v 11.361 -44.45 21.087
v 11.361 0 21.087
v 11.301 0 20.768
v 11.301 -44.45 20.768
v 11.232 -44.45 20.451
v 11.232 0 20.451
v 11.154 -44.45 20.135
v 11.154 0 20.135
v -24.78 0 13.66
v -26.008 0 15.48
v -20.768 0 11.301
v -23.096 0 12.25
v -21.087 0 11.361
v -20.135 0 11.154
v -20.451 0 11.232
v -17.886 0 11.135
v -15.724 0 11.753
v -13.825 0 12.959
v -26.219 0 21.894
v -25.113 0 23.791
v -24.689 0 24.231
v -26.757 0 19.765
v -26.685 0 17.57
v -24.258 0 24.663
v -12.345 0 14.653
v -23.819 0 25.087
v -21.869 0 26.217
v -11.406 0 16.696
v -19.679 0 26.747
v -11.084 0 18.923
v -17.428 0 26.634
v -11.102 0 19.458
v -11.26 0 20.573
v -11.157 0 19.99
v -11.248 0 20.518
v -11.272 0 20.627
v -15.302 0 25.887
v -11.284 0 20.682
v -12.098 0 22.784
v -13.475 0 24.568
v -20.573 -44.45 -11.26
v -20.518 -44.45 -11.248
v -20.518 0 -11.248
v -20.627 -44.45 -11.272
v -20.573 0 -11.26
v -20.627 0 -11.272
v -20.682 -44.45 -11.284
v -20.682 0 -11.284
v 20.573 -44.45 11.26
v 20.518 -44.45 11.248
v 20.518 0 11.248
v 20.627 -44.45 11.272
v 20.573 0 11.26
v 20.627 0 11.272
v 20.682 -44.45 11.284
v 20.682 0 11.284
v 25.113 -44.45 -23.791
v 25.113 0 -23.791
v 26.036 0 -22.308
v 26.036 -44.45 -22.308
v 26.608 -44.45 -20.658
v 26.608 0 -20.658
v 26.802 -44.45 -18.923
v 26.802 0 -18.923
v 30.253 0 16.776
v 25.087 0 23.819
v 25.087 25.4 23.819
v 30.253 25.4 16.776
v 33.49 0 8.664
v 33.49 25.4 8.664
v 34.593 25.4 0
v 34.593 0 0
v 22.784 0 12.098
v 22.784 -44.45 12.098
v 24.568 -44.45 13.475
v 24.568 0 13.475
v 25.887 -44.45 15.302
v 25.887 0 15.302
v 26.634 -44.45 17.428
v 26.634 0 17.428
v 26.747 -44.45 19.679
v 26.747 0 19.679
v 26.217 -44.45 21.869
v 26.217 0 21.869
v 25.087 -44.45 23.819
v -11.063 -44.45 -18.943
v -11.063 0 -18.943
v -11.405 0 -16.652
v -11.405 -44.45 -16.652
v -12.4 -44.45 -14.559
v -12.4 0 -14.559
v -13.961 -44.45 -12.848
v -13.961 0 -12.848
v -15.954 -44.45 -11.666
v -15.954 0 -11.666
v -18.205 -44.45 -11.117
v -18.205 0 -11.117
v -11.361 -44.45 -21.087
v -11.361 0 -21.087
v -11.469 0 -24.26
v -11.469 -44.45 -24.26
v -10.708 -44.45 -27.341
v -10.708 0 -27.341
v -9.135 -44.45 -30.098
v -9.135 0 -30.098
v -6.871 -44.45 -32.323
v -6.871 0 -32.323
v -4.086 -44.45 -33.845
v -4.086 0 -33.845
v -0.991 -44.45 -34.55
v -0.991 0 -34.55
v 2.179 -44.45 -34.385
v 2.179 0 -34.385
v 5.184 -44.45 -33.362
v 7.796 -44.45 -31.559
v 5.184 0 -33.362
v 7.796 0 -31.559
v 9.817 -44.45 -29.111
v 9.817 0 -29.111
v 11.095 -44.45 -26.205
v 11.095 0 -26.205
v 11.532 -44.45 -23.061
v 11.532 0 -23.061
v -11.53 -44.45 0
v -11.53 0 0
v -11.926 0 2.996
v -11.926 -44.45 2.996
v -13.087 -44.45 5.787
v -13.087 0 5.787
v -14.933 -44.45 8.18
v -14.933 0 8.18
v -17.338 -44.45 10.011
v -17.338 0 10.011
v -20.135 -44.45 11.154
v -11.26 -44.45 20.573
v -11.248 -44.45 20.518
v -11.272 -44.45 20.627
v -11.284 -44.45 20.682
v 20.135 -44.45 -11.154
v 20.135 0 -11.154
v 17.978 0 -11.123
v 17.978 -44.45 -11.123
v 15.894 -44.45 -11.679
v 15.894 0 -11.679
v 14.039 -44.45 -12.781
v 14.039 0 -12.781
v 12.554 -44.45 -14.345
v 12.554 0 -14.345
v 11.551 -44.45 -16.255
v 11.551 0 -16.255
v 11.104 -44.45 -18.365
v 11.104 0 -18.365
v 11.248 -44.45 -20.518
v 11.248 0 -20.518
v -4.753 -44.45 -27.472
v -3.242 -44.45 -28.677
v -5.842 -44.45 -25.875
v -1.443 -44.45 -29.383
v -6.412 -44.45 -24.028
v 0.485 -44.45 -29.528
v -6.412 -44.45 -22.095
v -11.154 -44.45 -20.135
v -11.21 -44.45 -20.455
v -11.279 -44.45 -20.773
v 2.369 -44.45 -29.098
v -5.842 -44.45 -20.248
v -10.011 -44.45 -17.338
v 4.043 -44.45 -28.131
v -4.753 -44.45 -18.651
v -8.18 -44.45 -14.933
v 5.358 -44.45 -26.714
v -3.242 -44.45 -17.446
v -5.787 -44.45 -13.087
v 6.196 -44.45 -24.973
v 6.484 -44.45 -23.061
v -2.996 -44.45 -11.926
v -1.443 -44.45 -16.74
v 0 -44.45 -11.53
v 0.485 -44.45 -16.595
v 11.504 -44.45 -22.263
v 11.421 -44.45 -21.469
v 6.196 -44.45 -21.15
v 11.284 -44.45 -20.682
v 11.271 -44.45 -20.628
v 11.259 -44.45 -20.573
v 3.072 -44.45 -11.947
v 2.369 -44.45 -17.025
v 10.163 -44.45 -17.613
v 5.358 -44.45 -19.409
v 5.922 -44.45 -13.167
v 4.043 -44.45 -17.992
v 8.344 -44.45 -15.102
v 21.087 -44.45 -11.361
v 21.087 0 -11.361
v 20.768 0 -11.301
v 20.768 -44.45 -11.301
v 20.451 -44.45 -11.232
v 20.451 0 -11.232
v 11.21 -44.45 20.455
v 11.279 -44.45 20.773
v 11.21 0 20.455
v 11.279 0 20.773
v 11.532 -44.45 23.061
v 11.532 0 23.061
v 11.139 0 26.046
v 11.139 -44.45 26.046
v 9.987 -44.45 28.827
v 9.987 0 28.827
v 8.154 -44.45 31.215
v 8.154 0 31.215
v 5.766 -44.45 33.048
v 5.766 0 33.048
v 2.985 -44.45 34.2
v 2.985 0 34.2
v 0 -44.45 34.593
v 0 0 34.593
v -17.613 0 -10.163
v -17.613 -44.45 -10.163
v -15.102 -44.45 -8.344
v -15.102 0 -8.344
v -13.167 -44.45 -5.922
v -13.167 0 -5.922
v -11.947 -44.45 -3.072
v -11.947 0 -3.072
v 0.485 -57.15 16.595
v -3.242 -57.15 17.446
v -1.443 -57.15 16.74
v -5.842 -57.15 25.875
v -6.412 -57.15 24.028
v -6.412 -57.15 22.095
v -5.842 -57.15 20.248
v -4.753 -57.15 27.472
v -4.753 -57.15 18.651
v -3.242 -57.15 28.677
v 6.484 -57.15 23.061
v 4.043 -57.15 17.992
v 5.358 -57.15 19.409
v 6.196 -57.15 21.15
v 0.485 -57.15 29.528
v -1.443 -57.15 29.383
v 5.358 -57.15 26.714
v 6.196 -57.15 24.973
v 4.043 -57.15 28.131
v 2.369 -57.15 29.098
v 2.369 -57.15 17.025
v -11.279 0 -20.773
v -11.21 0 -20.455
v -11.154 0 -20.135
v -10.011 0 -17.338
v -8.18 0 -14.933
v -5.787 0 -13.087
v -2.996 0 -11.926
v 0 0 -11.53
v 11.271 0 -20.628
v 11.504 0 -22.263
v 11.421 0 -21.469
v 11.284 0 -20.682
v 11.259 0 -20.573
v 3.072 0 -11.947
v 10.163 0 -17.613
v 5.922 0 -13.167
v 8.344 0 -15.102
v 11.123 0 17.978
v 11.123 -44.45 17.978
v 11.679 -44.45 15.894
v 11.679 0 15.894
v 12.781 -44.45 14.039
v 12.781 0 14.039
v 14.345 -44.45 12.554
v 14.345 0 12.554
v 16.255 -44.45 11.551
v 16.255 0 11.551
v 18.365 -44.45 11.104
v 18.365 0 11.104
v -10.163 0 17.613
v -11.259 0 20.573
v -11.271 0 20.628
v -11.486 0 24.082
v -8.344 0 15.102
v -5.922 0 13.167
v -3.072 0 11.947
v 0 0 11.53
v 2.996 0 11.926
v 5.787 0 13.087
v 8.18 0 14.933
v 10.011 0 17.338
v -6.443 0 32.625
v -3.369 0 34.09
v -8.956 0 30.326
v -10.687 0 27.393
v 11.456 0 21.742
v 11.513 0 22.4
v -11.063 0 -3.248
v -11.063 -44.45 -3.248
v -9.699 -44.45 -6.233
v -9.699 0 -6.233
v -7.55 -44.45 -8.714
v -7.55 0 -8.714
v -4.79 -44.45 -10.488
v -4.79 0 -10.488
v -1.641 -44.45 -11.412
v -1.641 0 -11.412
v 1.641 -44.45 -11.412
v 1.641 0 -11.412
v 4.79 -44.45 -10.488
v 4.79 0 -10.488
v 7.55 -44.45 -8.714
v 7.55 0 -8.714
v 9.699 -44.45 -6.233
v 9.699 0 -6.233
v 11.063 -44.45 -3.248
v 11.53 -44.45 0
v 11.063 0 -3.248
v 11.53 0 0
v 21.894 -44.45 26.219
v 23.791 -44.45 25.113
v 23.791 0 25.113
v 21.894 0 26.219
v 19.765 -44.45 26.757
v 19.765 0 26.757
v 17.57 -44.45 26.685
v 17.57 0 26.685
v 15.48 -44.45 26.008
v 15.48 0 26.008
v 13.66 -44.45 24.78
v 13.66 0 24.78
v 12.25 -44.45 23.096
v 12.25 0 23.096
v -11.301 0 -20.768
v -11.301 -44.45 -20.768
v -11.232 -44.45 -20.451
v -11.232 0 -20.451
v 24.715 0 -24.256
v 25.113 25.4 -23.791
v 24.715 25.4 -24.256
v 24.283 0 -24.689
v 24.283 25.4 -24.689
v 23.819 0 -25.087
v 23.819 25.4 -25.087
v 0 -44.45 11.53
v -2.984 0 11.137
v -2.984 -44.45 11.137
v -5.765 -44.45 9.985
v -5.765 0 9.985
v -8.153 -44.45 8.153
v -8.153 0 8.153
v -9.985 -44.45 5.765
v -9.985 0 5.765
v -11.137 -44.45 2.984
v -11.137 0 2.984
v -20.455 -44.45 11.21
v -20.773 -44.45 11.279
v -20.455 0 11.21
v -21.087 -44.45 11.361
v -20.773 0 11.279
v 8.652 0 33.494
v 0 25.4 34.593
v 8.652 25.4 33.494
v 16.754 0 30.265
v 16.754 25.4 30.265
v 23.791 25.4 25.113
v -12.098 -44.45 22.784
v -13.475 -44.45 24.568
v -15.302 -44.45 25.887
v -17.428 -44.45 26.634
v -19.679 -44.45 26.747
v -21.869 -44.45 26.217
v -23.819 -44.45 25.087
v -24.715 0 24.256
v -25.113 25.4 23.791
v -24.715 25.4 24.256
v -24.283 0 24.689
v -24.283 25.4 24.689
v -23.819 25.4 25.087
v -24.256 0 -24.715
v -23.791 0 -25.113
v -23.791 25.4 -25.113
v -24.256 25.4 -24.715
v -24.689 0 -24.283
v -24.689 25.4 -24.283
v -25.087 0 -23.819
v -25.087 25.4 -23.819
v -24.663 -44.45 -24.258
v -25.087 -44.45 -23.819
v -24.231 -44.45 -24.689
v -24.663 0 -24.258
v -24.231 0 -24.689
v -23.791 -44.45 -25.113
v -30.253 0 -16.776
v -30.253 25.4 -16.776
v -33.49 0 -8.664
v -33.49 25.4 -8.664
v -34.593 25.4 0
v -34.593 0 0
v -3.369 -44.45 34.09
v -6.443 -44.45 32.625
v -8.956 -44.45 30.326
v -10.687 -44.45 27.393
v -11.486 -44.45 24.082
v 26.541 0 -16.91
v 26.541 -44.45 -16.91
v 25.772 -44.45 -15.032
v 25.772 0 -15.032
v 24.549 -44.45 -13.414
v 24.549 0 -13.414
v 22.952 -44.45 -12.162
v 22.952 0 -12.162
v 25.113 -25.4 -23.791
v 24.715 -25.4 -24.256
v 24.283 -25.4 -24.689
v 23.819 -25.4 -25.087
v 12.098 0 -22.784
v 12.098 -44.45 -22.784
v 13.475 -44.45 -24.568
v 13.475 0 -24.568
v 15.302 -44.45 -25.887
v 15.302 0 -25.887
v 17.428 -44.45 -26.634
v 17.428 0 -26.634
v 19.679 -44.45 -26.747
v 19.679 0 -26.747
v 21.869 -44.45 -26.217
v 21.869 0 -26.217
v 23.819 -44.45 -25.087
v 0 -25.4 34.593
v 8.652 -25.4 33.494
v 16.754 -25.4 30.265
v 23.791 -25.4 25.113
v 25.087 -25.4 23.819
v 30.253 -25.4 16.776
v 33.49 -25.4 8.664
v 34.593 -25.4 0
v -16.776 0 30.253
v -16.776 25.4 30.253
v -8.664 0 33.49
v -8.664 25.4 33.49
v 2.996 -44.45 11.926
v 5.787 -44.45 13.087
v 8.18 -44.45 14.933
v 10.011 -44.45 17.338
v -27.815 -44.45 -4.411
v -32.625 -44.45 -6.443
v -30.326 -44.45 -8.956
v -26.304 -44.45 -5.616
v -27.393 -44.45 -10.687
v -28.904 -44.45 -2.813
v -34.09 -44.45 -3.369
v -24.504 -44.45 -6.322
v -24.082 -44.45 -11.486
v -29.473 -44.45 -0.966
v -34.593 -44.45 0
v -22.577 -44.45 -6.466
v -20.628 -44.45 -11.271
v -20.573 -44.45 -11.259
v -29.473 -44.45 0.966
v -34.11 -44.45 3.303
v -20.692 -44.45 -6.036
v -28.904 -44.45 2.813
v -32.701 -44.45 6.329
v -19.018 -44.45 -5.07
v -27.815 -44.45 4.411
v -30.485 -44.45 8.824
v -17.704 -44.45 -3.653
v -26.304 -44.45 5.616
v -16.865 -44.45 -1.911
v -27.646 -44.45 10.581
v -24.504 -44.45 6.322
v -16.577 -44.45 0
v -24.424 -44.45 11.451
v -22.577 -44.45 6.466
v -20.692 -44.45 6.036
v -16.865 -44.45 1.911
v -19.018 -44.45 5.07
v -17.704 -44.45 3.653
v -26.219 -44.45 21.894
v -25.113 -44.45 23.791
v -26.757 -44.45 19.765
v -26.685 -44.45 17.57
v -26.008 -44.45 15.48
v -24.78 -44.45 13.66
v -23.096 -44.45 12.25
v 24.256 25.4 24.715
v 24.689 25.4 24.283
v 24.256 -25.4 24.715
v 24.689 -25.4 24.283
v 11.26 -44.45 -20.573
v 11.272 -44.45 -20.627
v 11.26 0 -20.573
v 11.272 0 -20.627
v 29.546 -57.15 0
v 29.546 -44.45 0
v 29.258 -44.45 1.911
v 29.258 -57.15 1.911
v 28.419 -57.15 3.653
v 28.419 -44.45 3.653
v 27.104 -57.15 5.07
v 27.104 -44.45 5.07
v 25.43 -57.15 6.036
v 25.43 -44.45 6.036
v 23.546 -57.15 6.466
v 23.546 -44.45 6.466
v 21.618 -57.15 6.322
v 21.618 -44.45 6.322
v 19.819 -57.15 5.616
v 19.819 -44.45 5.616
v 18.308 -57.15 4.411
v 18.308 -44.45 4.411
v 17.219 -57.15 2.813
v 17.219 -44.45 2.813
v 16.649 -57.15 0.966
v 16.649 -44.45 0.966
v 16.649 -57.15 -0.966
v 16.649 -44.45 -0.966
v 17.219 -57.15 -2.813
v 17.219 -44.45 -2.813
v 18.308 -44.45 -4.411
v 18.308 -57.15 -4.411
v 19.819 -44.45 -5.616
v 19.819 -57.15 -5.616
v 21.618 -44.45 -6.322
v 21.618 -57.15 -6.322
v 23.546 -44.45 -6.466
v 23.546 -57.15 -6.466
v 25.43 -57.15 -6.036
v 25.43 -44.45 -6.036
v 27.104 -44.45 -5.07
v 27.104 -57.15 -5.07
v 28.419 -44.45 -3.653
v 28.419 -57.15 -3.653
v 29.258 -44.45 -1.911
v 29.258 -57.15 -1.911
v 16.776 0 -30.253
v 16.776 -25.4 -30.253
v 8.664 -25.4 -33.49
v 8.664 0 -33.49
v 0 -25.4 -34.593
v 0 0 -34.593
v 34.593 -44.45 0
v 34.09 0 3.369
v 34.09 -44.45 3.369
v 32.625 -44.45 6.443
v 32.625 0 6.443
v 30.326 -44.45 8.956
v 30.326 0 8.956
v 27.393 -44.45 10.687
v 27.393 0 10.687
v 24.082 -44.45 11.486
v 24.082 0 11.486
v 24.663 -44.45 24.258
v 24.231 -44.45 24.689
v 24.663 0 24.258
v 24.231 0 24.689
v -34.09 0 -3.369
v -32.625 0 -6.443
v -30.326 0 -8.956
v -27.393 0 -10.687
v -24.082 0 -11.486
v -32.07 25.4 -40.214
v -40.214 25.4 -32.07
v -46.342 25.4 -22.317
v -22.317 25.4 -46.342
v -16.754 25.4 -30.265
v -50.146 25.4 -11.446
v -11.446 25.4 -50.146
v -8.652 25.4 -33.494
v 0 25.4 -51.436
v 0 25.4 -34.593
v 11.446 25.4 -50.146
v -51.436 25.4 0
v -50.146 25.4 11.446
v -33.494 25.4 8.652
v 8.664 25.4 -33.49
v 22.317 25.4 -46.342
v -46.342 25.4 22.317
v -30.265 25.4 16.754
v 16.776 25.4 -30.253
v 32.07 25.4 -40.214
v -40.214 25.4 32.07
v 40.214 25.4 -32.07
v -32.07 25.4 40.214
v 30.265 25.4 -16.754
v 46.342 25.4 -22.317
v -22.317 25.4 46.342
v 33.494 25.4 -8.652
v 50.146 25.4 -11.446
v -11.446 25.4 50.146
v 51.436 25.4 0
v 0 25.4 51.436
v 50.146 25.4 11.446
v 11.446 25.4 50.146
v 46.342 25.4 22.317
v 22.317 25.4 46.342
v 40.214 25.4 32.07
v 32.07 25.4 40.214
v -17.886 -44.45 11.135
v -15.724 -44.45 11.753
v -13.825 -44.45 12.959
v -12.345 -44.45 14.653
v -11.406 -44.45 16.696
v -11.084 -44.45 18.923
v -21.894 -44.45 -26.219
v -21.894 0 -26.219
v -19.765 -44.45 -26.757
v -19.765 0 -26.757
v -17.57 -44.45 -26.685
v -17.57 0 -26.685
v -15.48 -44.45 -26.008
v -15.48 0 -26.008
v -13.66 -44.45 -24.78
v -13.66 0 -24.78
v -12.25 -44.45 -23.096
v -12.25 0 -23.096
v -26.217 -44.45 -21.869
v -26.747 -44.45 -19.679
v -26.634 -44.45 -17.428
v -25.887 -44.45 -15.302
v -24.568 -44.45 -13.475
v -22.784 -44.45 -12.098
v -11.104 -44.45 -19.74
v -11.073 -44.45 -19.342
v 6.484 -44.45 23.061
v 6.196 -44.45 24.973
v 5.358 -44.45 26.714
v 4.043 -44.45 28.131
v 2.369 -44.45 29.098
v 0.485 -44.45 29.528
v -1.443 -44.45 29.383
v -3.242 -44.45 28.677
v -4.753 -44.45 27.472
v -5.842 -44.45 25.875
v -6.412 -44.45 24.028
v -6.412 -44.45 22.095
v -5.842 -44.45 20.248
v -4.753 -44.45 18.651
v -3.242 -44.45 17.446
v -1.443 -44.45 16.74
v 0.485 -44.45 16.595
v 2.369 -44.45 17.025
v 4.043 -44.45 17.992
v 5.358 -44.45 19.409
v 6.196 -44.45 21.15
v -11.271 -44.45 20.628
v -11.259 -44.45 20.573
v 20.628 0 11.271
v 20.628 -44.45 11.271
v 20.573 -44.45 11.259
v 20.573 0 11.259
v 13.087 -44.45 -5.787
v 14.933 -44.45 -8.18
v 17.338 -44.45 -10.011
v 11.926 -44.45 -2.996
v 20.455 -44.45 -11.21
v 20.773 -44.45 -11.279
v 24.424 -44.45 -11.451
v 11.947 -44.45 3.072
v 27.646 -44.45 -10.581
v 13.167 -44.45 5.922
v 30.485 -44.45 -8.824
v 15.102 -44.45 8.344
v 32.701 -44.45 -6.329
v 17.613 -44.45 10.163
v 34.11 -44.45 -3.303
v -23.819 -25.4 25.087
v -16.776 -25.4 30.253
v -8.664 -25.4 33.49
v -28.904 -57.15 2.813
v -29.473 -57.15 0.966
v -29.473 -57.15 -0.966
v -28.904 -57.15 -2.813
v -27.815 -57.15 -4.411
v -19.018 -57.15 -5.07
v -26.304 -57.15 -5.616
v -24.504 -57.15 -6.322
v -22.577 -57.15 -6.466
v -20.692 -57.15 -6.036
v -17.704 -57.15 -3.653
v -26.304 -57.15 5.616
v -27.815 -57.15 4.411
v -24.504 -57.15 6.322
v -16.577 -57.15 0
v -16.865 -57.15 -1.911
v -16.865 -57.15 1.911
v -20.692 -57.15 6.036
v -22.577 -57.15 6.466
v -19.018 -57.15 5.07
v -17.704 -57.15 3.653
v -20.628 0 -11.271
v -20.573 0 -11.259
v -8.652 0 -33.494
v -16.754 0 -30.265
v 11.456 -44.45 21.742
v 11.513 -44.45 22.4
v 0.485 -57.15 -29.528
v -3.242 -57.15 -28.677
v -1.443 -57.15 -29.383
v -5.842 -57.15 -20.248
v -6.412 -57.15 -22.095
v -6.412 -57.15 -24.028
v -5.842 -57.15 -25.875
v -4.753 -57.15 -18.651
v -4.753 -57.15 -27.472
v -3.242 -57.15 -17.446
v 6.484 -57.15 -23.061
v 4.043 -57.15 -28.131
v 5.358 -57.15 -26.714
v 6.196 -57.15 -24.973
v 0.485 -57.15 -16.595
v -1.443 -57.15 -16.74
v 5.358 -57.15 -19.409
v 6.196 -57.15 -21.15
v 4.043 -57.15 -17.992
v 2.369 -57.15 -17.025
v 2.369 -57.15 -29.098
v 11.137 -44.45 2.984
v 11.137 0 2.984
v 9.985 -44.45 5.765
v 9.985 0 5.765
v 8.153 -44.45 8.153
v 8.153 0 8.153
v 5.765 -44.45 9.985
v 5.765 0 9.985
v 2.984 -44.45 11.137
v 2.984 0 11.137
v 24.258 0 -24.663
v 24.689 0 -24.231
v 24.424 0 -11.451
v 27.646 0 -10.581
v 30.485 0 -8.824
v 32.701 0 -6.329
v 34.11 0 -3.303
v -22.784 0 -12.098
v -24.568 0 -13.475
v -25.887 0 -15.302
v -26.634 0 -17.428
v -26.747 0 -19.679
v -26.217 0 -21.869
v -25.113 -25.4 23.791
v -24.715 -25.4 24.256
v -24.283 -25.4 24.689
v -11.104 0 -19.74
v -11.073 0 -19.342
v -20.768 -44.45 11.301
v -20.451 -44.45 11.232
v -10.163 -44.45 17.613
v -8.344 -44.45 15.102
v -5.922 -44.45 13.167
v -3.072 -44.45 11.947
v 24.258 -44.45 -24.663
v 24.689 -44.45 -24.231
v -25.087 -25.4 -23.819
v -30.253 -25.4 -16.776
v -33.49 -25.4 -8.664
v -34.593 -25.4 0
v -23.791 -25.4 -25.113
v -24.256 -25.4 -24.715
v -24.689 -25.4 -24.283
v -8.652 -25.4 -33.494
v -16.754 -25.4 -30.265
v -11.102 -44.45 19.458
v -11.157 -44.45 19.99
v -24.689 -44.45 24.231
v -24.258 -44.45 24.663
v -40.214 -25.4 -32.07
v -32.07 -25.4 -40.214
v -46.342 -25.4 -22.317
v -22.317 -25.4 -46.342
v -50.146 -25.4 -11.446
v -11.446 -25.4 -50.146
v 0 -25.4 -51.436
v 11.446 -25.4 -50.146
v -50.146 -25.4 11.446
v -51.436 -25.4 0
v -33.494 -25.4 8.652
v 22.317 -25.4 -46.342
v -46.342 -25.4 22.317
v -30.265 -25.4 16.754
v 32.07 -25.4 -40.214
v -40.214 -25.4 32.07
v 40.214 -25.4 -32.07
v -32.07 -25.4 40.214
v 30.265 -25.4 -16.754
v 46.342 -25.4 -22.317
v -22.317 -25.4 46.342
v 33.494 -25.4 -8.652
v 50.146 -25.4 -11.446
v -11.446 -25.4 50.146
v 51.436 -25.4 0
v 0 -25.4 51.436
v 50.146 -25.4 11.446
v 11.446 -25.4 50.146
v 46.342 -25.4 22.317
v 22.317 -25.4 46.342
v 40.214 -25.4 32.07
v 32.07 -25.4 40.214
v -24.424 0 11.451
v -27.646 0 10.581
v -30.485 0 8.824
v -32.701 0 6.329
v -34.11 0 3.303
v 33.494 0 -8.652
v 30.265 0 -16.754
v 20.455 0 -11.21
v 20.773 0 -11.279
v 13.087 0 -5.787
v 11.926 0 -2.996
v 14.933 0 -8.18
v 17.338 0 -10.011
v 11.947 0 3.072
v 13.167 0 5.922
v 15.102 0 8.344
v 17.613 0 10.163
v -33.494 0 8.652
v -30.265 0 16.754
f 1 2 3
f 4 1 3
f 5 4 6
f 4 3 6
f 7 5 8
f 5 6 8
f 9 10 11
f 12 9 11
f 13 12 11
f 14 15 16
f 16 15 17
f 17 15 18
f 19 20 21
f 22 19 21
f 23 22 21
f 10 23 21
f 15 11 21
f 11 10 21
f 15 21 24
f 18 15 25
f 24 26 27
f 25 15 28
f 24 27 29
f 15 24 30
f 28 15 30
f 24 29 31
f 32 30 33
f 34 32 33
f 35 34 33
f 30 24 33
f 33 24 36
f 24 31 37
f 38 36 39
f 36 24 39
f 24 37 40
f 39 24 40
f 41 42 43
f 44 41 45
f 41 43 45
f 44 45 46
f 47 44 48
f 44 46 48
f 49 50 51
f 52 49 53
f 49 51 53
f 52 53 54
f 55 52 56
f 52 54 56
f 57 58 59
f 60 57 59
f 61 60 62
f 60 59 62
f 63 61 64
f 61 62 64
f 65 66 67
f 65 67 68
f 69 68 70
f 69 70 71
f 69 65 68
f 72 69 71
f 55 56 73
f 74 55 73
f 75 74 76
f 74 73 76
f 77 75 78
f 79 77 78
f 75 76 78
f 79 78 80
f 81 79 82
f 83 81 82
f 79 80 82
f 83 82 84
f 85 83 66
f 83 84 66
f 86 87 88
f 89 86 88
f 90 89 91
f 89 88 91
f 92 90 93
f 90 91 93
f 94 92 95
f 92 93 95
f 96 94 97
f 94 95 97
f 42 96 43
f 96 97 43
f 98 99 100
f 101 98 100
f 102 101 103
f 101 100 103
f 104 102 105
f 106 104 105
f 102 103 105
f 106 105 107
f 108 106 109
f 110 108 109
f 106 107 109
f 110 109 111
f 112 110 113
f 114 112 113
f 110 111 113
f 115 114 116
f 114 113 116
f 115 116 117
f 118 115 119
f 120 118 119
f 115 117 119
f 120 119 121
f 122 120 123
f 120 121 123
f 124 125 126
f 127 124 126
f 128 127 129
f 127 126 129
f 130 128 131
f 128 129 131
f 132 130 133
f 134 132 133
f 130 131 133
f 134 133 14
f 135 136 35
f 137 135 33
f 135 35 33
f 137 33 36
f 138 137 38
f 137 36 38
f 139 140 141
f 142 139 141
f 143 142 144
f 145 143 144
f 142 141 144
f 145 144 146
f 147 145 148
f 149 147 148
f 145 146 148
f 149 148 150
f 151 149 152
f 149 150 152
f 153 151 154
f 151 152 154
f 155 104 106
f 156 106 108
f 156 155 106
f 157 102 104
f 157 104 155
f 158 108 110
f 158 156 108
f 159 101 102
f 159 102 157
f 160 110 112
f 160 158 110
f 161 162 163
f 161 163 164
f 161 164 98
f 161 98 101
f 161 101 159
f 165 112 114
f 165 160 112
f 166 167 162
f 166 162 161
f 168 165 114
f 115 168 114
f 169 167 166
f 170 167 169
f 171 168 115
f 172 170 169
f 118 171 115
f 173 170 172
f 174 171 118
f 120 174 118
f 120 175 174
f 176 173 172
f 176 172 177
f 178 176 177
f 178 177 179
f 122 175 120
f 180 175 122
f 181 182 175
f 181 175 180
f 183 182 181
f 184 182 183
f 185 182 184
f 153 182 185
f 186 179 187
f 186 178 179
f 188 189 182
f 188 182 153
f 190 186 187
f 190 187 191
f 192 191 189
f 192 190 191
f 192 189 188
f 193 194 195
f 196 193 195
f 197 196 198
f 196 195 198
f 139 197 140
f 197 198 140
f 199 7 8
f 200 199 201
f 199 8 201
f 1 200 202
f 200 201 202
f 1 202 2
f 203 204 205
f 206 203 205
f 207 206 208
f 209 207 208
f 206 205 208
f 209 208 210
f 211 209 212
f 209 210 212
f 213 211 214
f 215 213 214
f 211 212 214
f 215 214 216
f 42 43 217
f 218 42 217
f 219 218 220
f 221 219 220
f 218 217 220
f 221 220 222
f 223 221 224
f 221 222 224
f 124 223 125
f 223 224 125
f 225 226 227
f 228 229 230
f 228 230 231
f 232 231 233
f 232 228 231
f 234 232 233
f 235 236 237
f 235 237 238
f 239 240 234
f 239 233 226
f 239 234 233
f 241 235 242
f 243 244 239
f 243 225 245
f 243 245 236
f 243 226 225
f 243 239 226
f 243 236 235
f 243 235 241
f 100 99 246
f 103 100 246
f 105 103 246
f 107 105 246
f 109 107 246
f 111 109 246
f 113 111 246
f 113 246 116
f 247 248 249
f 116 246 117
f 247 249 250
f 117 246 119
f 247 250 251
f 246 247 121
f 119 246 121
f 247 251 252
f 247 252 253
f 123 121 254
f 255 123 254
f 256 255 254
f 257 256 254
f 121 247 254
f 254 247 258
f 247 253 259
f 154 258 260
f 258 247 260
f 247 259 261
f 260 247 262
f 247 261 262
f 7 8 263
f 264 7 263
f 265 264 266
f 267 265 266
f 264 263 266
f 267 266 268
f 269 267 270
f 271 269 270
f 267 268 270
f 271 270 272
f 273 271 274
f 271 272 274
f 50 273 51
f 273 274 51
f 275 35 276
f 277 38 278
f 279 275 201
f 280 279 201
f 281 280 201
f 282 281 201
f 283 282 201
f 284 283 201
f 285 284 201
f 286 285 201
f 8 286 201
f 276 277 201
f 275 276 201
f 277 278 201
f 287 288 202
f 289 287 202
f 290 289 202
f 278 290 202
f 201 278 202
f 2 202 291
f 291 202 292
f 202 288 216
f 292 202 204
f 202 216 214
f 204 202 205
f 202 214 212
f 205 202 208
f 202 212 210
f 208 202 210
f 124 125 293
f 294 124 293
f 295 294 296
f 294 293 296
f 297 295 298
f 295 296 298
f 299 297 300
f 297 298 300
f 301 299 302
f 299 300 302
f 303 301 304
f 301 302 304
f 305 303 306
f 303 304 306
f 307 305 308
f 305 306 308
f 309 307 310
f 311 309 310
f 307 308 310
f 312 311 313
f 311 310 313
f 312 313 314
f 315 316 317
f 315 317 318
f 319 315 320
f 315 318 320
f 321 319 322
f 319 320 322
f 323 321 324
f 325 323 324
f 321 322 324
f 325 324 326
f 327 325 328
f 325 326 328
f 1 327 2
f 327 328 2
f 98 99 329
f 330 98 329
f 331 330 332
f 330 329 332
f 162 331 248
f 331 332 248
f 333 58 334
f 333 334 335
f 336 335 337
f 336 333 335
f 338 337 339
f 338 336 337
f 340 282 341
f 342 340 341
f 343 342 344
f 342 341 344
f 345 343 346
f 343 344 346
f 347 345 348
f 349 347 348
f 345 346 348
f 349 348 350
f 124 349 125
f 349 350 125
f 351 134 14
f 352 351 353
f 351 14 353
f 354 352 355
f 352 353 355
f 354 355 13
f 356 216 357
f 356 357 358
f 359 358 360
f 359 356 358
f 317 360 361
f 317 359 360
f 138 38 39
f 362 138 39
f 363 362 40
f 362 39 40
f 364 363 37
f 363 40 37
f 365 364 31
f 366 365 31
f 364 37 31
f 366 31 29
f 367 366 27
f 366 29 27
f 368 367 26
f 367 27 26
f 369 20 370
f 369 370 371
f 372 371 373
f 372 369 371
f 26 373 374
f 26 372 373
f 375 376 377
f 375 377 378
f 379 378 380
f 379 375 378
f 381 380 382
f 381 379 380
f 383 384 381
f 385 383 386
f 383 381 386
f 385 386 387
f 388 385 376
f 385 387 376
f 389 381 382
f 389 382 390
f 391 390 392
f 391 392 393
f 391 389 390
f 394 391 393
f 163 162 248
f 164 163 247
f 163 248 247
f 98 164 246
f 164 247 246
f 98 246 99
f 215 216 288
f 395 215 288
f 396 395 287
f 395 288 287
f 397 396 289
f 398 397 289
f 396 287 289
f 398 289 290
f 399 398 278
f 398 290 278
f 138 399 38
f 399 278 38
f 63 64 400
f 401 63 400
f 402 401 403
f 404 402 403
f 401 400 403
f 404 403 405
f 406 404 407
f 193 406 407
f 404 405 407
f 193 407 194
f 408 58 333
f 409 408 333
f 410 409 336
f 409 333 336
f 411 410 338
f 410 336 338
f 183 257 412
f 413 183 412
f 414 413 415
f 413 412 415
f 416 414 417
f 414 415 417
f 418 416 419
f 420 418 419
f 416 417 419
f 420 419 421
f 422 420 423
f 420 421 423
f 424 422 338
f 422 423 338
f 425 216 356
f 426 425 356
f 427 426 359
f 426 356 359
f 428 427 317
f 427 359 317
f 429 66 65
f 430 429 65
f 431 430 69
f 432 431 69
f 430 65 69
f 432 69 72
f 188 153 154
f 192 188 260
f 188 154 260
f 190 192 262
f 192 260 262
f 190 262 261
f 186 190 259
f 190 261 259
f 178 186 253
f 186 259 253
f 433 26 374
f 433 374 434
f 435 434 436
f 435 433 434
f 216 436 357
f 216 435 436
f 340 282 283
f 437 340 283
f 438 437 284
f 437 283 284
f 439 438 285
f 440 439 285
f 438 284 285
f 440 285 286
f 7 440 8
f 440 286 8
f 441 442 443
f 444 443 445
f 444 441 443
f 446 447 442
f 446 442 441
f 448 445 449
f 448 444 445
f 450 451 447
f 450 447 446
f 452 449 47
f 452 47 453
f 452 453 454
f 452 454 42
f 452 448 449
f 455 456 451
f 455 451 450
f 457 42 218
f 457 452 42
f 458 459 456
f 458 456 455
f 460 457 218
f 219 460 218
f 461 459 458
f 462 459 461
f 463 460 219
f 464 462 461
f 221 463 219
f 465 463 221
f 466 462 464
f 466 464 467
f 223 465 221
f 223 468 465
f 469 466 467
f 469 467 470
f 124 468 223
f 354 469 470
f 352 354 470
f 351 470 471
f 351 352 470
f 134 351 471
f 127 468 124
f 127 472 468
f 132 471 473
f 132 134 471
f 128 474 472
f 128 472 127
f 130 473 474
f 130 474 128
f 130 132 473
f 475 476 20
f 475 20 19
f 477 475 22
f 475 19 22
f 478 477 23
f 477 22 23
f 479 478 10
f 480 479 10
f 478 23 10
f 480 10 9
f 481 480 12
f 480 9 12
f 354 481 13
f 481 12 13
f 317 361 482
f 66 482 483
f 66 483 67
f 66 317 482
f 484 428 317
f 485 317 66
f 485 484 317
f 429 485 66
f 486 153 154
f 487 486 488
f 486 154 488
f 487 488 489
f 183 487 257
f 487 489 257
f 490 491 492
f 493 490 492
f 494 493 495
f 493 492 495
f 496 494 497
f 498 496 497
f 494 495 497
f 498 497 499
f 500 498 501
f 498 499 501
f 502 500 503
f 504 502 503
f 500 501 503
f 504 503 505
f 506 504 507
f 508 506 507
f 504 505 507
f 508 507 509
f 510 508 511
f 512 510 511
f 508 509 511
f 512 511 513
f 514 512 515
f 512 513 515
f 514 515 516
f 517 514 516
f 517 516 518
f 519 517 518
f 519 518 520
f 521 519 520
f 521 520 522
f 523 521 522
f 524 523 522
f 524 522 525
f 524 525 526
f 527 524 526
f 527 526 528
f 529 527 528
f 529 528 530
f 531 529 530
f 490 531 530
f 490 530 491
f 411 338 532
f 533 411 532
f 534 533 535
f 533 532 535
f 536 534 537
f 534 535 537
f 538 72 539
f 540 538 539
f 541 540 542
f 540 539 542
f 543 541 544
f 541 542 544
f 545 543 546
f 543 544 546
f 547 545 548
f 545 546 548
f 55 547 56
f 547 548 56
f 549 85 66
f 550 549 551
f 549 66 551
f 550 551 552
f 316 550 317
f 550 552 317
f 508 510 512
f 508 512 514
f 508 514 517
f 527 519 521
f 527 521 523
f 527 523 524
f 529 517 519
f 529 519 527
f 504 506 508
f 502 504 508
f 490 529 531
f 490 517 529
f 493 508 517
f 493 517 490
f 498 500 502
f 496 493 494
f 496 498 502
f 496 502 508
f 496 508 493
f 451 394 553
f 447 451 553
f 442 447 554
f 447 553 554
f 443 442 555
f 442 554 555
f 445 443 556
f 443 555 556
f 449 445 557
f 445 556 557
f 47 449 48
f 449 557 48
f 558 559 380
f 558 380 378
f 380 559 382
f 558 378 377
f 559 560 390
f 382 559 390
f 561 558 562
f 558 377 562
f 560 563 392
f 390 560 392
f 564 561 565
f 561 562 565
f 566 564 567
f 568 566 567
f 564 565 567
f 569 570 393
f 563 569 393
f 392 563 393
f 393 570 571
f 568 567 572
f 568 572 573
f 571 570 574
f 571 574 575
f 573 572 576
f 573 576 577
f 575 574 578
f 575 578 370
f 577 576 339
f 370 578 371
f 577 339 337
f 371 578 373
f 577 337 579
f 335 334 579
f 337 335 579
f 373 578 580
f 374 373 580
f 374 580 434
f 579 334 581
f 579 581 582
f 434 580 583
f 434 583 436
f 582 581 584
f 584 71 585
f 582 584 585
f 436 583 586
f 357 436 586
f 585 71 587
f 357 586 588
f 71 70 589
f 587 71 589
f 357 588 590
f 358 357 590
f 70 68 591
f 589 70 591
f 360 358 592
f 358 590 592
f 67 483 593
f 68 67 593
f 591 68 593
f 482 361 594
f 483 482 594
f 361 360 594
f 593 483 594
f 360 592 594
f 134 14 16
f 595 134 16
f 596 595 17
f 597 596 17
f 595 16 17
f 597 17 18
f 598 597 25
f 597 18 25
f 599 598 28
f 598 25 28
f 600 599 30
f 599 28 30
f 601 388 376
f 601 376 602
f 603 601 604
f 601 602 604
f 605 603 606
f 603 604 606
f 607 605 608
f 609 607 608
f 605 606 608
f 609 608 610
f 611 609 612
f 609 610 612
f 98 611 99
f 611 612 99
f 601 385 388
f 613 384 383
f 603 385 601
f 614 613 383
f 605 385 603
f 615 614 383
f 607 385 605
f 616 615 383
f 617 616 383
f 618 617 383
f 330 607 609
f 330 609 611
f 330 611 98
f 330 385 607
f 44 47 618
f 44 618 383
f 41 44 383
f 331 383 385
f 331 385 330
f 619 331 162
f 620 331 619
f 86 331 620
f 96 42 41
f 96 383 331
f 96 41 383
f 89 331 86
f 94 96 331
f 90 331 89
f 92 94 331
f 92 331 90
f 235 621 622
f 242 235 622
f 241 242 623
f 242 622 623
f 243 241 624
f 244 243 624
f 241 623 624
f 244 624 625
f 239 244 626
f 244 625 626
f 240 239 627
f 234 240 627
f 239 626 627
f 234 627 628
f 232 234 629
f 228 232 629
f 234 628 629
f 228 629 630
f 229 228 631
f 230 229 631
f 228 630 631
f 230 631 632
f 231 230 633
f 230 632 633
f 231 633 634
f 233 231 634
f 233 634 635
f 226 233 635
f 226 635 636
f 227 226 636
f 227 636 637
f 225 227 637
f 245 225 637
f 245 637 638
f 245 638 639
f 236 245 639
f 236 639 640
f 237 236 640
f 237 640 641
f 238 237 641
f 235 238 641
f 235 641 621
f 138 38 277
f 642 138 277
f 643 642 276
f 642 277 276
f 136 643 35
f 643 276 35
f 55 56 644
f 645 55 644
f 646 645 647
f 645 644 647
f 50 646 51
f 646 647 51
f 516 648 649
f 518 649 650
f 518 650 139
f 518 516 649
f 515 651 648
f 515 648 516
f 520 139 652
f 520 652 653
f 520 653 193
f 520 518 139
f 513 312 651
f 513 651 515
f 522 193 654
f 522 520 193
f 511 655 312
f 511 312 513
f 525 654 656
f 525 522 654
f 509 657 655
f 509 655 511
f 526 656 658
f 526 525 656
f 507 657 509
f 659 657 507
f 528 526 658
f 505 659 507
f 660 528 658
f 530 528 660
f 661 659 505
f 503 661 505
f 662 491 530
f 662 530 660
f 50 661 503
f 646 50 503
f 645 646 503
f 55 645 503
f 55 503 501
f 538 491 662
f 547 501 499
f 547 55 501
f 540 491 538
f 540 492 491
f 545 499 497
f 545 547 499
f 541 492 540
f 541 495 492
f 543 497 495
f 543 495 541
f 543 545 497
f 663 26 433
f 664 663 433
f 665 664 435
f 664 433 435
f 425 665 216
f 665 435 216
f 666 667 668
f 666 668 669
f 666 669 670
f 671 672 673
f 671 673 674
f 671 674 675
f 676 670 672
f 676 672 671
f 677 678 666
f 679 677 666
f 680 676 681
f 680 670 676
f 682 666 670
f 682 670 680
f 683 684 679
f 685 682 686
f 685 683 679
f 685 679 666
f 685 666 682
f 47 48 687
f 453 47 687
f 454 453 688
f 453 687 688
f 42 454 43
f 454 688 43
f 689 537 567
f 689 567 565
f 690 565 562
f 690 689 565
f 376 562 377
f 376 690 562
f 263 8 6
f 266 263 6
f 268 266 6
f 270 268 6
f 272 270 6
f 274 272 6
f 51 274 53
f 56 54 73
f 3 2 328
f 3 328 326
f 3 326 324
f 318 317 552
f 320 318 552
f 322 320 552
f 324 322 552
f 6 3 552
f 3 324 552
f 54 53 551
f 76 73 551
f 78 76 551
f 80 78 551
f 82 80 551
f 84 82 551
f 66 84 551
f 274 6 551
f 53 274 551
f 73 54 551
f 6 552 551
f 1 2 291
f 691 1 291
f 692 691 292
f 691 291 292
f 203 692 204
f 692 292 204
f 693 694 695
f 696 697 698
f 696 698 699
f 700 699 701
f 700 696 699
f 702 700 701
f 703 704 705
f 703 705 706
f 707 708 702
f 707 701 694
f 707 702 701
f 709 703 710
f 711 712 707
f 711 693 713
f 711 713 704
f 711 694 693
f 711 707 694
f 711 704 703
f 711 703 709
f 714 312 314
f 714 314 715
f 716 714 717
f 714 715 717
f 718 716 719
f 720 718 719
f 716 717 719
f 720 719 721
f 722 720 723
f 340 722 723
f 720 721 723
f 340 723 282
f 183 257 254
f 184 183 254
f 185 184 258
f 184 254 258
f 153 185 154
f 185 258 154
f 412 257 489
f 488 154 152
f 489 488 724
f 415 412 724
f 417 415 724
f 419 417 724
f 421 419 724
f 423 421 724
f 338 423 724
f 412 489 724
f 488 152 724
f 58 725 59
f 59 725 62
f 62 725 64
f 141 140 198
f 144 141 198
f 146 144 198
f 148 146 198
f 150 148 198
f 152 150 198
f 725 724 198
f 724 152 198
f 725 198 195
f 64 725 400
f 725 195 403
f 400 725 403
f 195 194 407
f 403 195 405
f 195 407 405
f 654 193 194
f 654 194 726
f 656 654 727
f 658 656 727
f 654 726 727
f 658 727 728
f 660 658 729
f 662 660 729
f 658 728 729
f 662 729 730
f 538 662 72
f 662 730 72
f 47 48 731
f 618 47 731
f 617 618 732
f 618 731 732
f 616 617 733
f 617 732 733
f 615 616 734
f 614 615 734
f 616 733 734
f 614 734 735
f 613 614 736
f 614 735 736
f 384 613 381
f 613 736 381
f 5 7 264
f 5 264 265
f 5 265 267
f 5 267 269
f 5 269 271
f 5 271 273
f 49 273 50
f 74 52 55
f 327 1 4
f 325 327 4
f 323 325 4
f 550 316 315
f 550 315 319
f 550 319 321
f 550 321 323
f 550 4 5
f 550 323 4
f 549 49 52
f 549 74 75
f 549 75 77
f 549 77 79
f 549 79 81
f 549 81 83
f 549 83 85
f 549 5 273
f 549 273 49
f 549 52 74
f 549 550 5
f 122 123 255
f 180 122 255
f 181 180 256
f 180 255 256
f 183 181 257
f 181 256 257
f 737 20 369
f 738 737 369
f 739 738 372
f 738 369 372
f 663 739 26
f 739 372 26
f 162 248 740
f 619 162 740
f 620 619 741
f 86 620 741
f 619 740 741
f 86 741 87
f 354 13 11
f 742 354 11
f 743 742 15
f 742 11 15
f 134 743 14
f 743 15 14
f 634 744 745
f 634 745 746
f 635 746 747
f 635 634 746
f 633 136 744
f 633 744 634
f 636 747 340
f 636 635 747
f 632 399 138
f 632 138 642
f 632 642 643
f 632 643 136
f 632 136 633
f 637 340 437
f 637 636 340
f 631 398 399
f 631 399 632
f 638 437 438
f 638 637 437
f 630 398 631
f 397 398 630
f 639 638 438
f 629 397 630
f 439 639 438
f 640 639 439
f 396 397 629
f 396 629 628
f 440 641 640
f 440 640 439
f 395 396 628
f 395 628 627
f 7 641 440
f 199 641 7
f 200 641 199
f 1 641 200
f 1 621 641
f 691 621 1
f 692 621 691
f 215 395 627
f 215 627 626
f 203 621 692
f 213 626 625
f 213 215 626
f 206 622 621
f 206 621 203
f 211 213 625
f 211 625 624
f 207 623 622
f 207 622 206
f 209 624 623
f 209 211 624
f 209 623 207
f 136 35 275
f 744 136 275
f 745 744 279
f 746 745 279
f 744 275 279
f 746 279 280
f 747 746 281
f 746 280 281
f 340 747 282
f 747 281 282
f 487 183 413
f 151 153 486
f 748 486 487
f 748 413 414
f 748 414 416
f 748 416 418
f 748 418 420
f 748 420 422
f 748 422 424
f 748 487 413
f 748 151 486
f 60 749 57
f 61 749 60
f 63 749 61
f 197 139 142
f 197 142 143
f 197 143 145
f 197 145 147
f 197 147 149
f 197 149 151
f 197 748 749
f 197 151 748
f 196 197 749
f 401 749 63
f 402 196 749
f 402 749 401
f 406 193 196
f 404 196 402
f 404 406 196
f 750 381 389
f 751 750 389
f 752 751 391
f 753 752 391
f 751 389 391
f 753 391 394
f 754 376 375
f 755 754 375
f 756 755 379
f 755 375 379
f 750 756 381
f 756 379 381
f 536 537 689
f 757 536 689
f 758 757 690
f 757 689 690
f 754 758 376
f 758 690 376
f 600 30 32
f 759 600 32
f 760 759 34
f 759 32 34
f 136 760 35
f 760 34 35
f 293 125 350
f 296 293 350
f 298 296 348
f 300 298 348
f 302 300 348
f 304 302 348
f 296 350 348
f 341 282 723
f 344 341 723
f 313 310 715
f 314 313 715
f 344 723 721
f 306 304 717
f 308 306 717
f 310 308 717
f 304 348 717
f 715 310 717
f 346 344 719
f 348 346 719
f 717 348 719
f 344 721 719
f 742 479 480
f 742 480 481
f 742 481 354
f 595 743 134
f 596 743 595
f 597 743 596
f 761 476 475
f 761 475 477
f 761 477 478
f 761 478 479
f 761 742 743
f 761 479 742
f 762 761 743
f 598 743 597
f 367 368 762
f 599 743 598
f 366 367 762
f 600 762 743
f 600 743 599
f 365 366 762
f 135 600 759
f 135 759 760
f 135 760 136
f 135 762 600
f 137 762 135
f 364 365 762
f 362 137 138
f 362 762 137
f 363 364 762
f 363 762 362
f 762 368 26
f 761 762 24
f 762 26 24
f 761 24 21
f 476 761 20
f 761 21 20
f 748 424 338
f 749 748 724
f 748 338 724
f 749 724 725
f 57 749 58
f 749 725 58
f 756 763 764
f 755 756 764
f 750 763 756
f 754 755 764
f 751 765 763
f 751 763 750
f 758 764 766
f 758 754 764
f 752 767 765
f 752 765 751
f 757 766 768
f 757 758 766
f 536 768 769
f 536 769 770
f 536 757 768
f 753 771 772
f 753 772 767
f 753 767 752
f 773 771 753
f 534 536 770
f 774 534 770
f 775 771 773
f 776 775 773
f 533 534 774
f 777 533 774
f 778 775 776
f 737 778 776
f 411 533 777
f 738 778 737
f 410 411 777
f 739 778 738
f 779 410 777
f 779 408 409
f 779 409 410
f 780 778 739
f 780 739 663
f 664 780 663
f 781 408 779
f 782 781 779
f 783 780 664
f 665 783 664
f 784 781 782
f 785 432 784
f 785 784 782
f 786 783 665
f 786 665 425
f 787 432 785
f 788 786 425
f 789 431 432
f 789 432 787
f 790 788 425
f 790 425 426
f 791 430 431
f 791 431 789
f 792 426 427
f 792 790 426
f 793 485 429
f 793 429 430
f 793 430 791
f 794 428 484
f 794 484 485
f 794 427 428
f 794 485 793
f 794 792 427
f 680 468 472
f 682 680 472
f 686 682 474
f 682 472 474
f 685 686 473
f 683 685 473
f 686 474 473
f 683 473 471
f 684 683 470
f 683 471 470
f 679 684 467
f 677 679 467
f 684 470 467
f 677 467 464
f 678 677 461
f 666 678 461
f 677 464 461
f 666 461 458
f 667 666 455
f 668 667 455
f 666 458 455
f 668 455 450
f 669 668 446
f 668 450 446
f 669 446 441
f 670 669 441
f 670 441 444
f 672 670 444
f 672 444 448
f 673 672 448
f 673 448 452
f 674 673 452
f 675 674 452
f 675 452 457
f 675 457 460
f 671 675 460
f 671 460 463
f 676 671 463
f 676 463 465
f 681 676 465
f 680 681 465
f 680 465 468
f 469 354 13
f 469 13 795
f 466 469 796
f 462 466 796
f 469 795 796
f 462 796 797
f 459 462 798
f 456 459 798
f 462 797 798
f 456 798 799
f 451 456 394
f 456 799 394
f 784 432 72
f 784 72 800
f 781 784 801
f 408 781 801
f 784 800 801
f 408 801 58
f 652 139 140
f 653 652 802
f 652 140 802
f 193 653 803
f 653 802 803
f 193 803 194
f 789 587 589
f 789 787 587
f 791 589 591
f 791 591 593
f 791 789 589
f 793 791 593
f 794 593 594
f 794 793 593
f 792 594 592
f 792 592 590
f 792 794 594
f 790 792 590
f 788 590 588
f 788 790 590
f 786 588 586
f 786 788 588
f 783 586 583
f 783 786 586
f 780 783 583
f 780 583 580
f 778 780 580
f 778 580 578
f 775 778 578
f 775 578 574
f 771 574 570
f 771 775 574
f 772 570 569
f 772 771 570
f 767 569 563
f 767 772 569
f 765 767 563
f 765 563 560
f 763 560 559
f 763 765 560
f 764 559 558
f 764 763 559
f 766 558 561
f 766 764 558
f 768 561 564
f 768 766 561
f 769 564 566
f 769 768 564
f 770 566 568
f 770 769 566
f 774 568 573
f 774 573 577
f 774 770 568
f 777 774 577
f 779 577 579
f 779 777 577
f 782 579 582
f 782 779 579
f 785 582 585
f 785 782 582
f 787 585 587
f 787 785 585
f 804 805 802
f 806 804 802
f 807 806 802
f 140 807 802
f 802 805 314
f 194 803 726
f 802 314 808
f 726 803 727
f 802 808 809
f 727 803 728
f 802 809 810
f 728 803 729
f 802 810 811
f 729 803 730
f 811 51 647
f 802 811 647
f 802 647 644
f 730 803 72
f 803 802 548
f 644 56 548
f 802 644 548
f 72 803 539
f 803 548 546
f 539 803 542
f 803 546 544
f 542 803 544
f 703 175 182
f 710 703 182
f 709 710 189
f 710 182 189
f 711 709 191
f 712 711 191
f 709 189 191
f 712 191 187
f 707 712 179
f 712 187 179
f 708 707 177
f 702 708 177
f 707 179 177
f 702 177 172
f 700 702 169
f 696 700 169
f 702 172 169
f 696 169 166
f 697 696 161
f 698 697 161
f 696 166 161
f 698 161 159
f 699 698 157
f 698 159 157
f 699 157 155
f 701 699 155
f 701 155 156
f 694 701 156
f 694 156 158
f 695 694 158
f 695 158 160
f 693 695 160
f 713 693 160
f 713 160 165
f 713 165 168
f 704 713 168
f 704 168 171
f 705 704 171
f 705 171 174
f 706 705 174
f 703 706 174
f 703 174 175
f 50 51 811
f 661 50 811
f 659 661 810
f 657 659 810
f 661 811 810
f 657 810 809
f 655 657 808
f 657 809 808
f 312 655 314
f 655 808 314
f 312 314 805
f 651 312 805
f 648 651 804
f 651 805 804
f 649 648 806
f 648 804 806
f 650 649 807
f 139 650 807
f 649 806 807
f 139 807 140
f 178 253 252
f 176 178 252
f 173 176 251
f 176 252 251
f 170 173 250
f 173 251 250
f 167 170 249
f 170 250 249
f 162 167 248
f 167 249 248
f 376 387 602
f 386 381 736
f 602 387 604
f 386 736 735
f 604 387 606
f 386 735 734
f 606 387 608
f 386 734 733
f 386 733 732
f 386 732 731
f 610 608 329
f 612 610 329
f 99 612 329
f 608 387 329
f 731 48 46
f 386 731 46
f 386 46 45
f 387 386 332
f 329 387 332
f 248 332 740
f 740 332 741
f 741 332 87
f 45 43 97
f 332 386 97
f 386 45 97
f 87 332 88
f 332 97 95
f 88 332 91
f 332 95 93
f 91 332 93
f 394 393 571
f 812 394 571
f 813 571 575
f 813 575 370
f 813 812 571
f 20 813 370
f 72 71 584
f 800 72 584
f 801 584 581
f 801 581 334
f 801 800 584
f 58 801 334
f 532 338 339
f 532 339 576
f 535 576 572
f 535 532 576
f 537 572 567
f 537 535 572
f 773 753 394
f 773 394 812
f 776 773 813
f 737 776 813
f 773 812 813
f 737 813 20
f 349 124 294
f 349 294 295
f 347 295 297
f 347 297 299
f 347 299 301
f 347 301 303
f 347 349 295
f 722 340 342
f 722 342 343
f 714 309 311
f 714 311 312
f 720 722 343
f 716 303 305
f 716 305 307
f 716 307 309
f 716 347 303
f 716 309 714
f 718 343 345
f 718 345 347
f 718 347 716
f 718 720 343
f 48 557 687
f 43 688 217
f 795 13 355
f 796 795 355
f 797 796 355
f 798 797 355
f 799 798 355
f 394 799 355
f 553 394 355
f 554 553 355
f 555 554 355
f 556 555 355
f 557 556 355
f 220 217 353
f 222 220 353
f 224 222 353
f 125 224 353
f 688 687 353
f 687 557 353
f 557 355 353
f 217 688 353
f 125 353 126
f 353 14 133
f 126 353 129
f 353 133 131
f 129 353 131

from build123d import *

# Parameters (mm, degrees)
F0_R           = 6.4844466941
F1_DEPTH       = 44.45
F2_DEPTH       = 57.15
F3_DEPTH       = 44.45
F4_DEPTH       = 57.15
F5_DEPTH       = 44.45
F6_DEPTH       = 44.45
F7_DEPTH       = 44.45
F8_DEPTH       = 44.45
F9_DEPTH       = 44.45
F10_DEPTH      = 57.15
F11_DEPTH      = 44.45
F12_DEPTH      = 57.15
F13_DEPTH      = 44.45
F0_R_2         = 51.4356597364
F14_DEPTH      = 25.4
F14_DEPTH_BACK = 25.4


with BuildPart() as f1:
    # F0 (on Front) → F1 (new body)
    with BuildSketch(Plane.XZ):
        with BuildLine():
            ThreePointArc((-11.2475634808, 20.5177545372), (-7.198803281, 14.0527878203), (-1.41e-08, 11.5297964744))
            ThreePointArc((-1.41e-08, 11.5297964744), (7.0440139558, 13.9312449997), (11.1542048678, 20.1353902667))
            ThreePointArc((11.1542048678, 20.1353902667), (11.2430218597, 20.6145358258), (11.3613629352, 21.0872559488))
            ThreePointArc((11.3613629352, 21.0872559488), (11.4889619066, 22.0706629743), (11.5316, 23.0613964744))
            ThreePointArc((11.5316, 23.0613964744), (8.1540725102, 31.2154690801), (-1.351e-07, 34.5929964744))
            ThreePointArc((-1.351e-07, 34.5929964744), (-8.955812233, 30.3257770954), (-11.2835042825, 20.6822517398))
            ThreePointArc((-11.2835042825, 20.6822517398), (-11.2650933427, 20.6000993914), (-11.2475634808, 20.5177545372))
        make_face()
        with Locations((0, 23.0613964744)):
            Circle(F0_R, mode=Mode.SUBTRACT)
    extrude(amount=F1_DEPTH)

    # F0 (on Front) → F2 (join)
    with BuildSketch(Plane.XZ):
        with Locations((0, 23.0613964744)):
            Circle(F0_R)
    extrude(amount=F2_DEPTH)


with BuildPart() as f3:
    # F0 (on Front) → F3 (new body)
    with BuildSketch(Plane.XZ):
        with BuildLine():
            ThreePointArc((-20.5177545372, -11.2475634808), (-14.0527878159, -7.1988032755), (-11.5297964744, 0))
            ThreePointArc((-11.5297964744, 0), (-13.931245004, 7.0440139614), (-20.1353902667, 11.1542048678))
            ThreePointArc((-20.1353902667, 11.1542048678), (-20.6145358258, 11.2430218597), (-21.0872559488, 11.3613629352))
            ThreePointArc((-21.0872559488, 11.3613629352), (-30.4847649711, 8.8244772492), (-34.5929964744, 0))
            ThreePointArc((-34.5929964744, 0), (-30.3257771479, -8.9558121904), (-20.6822517398, -11.2835042825))
            ThreePointArc((-20.6822517398, -11.2835042825), (-20.6000993914, -11.2650933427), (-20.5177545372, -11.2475634808))
        make_face()
        with Locations((-23.0613964744, 0)):
            Circle(F0_R, mode=Mode.SUBTRACT)
    extrude(amount=F3_DEPTH)

    # F0 (on Front) → F4 (join)
    with BuildSketch(Plane.XZ):
        with Locations((-23.0613964744, 0)):
            Circle(F0_R)
    extrude(amount=F4_DEPTH)


with BuildPart() as f5:
    # F0 (on Front) → F5 (new body)
    with BuildSketch(Plane.XZ):
        with BuildLine():
            ThreePointArc((-11.3613629352, -21.0872559488), (-11.2678396528, -20.6091346372), (-11.1542048678, -20.1353902667))
            ThreePointArc((-11.1542048678, -20.1353902667), (-11.0860280113, -19.5410367429), (-11.0632584142, -18.9432192621))
            ThreePointArc((-11.0632584142, -18.9432192621), (-13.9611383538, -12.84792159), (-20.5177545372, -11.2475634808))
            ThreePointArc((-20.5177545372, -11.2475634808), (-20.5999375393, -11.2658341223), (-20.6822517398, -11.2835042825))
            ThreePointArc((-20.6822517398, -11.2835042825), (-26.3373876023, -16.3379232965), (-25.0866608948, -23.8187919556))
            ThreePointArc((-25.0866608948, -23.8187919556), (-24.4475637175, -24.4743137464), (-23.7913434141, -25.1126936753))
            ThreePointArc((-23.7913434141, -25.1126936753), (-16.5011125803, -26.420165188), (-11.3613629352, -21.0872559488))
        make_face()
    extrude(amount=F5_DEPTH)


with BuildPart() as f6:
    # F0 (on Front) → F6 (new body)
    with BuildSketch(Plane.XZ):
        with BuildLine():
            ThreePointArc((-11.0839630463, 18.9225146299), (-11.1249701359, 19.7243181383), (-11.2475634808, 20.5177545372))
            ThreePointArc((-11.2475634808, 20.5177545372), (-11.2658341223, 20.5999375393), (-11.2835042825, 20.6822517398))
            ThreePointArc((-11.2835042825, 20.6822517398), (-16.3379232965, 26.3373876023), (-23.8187919556, 25.0866608948))
            ThreePointArc((-23.8187919556, 25.0866608948), (-24.4743137464, 24.4475637175), (-25.1126936753, 23.7913434141))
            ThreePointArc((-25.1126936753, 23.7913434141), (-26.420165188, 16.5011125803), (-21.0872559488, 11.3613629352))
            ThreePointArc((-21.0872559488, 11.3613629352), (-20.6091346372, 11.2678396528), (-20.1353902667, 11.1542048678))
            ThreePointArc((-20.1353902667, 11.1542048678), (-13.824707228, 12.9585610066), (-11.0839630463, 18.9225146299))
        make_face()
    extrude(amount=F6_DEPTH)


with BuildPart() as f7:
    # F0 (on Front) → F7 (new body)
    with BuildSketch(Plane.XZ):
        with BuildLine():
            ThreePointArc((21.0872559488, -11.3613629352), (20.6091346372, -11.2678396528), (20.1353902667, -11.1542048678))
            ThreePointArc((20.1353902667, -11.1542048678), (13.2429697795, -13.5118710359), (11.2475634808, -20.5177545372))
            ThreePointArc((11.2475634808, -20.5177545372), (11.2658341223, -20.5999375393), (11.2835042825, -20.6822517398))
            ThreePointArc((11.2835042825, -20.6822517398), (16.3379232965, -26.3373876023), (23.8187919556, -25.0866608948))
            ThreePointArc((23.8187919556, -25.0866608948), (24.4743137464, -24.4475637175), (25.1126936753, -23.7913434141))
            ThreePointArc((25.1126936753, -23.7913434141), (26.368021899, -21.4993759121), (26.8024754778, -18.9225146299))
            ThreePointArc((26.8024754778, -18.9225146299), (25.2129258709, -14.183454881), (21.0872559488, -11.3613629352))
        make_face()
    extrude(amount=F7_DEPTH)


with BuildPart() as f8:
    # F0 (on Front) → F8 (new body)
    with BuildSketch(Plane.XZ):
        with BuildLine():
            ThreePointArc((11.1542048678, 20.1353902667), (13.5118710359, 13.2429697795), (20.5177545372, 11.2475634808))
            ThreePointArc((20.5177545372, 11.2475634808), (20.5999375393, 11.2658341223), (20.6822517398, 11.2835042825))
            ThreePointArc((20.6822517398, 11.2835042825), (25.0706091756, 14.0474208877), (26.7817708457, 18.9432192621))
            ThreePointArc((26.7817708457, 18.9432192621), (26.3459071533, 21.5241399716), (25.0866608948, 23.8187919556))
            ThreePointArc((25.0866608948, 23.8187919556), (24.4475637175, 24.4743137464), (23.7913434141, 25.1126936753))
            ThreePointArc((23.7913434141, 25.1126936753), (16.5011125803, 26.420165188), (11.3613629352, 21.0872559488))
            ThreePointArc((11.3613629352, 21.0872559488), (11.2678396528, 20.6091346372), (11.1542048678, 20.1353902667))
        make_face()
    extrude(amount=F8_DEPTH)


with BuildPart() as f9:
    # F0 (on Front) → F9 (new body)
    with BuildSketch(Plane.XZ):
        with BuildLine():
            ThreePointArc((20.5177545372, 11.2475634808), (14.0527878159, 7.1988032755), (11.5297964744, 0))
            ThreePointArc((11.5297964744, 0), (13.931245004, -7.0440139614), (20.1353902667, -11.1542048678))
            ThreePointArc((20.1353902667, -11.1542048678), (20.6145358258, -11.2430218597), (21.0872559488, -11.3613629352))
            ThreePointArc((21.0872559488, -11.3613629352), (30.4847649711, -8.8244772492), (34.5929964744, 0))
            ThreePointArc((34.5929964744, 0), (30.3257771479, 8.9558121904), (20.6822517398, 11.2835042825))
            ThreePointArc((20.6822517398, 11.2835042825), (20.6000993914, 11.2650933427), (20.5177545372, 11.2475634808))
        make_face()
        with Locations((23.0613964744, 0)):
            Circle(F0_R, mode=Mode.SUBTRACT)
    extrude(amount=F9_DEPTH)

    # F0 (on Front) → F10 (join)
    with BuildSketch(Plane.XZ):
        with Locations((23.0613964744, 0)):
            Circle(F0_R)
    extrude(amount=F10_DEPTH)


with BuildPart() as f11:
    # F0 (on Front) → F11 (new body)
    with BuildSketch(Plane.XZ):
        with BuildLine():
            ThreePointArc((11.2475634808, -20.5177545372), (7.1988032634, -14.0527878062), (-3.1e-08, -11.5297964744))
            ThreePointArc((-3.1e-08, -11.5297964744), (-7.0440139736, -13.9312450134), (-11.1542048678, -20.1353902667))
            ThreePointArc((-11.1542048678, -20.1353902667), (-11.2430218597, -20.6145358258), (-11.3613629352, -21.0872559488))
            ThreePointArc((-11.3613629352, -21.0872559488), (-8.8244772799, -30.4847649346), (-9.53e-08, -34.5929964744))
            ThreePointArc((-9.53e-08, -34.5929964744), (8.1540725243, -31.215469066), (11.5316, -23.0613964744))
            ThreePointArc((11.5316, -23.0613964744), (11.4694083662, -21.8653737788), (11.2835042825, -20.6822517398))
            ThreePointArc((11.2835042825, -20.6822517398), (11.2650933427, -20.6000993914), (11.2475634808, -20.5177545372))
        make_face()
        with Locations((0, -23.0613964744)):
            Circle(F0_R, mode=Mode.SUBTRACT)
    extrude(amount=F11_DEPTH)

    # F0 (on Front) → F12 (join)
    with BuildSketch(Plane.XZ):
        with Locations((0, -23.0613964744)):
            Circle(F0_R)
    extrude(amount=F12_DEPTH)


with BuildPart() as f13:
    # F0 (on Front) → F13 (new body)
    with BuildSketch(Plane.XZ):
        with BuildLine():
            ThreePointArc((-3.1e-08, -11.5297964744), (8.1527972618, -8.1527972837), (11.5297964744, 0))
            ThreePointArc((11.5297964744, 0), (8.1527972677, 8.1527972777), (-1.41e-08, 11.5297964744))
            ThreePointArc((-1.41e-08, 11.5297964744), (-8.1527972777, 8.1527972677), (-11.5297964744, 0))
            ThreePointArc((-11.5297964744, 0), (-8.1527972837, -8.1527972618), (-3.1e-08, -11.5297964744))
        make_face()
    extrude(amount=F13_DEPTH)


with BuildPart() as f14:
    # F0 (on Front) → F14 (new body, two sides)
    with BuildSketch(Plane.XZ) as f14_sk:
        Circle(F0_R_2)
        with BuildLine():
            ThreePointArc((25.0866608948, 23.8187919556), (32.1286334674, 12.8228825384), (34.5929964744, 0))
            ThreePointArc((34.5929964744, 0), (32.1356400967, -12.8053129853), (25.1126936753, -23.7913434141))
            ThreePointArc((25.1126936753, -23.7913434141), (24.5035904944, -24.4768084665), (23.8187919556, -25.0866608948))
            ThreePointArc((23.8187919556, -25.0866608948), (12.8228824942, -32.128633485), (-9.53e-08, -34.5929964744))
            ThreePointArc((-9.53e-08, -34.5929964744), (-12.8053130296, -32.135640079), (-23.7913434141, -25.1126936753))
            ThreePointArc((-23.7913434141, -25.1126936753), (-24.4768084665, -24.5035904944), (-25.0866608948, -23.8187919556))
            ThreePointArc((-25.0866608948, -23.8187919556), (-32.1286334674, -12.8228825384), (-34.5929964744, 0))
            ThreePointArc((-34.5929964744, 0), (-32.1356400967, 12.8053129853), (-25.1126936753, 23.7913434141))
            ThreePointArc((-25.1126936753, 23.7913434141), (-24.5035904944, 24.4768084665), (-23.8187919556, 25.0866608948))
            ThreePointArc((-23.8187919556, 25.0866608948), (-12.8228826012, 32.1286334423), (-1.351e-07, 34.5929964744))
            ThreePointArc((-1.351e-07, 34.5929964744), (12.8053129226, 32.1356401217), (23.7913434141, 25.1126936753))
            ThreePointArc((23.7913434141, 25.1126936753), (24.4768084665, 24.5035904944), (25.0866608948, 23.8187919556))
        make_face(mode=Mode.SUBTRACT)
    extrude(amount=F14_DEPTH)
    extrude(f14_sk.sketch, amount=-F14_DEPTH_BACK)


solid = Compound([f1.part, f3.part, f5.part, f6.part, f7.part, f8.part, f9.part, f11.part, f13.part, f14.part])
